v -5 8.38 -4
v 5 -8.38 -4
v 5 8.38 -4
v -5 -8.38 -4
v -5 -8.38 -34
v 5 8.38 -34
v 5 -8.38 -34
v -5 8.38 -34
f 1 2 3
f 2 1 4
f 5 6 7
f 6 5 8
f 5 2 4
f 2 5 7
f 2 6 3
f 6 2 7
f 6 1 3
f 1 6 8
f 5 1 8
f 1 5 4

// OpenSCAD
module radiused_cube(size,r)
{
    hull()
    {
        translate([r,r,0]) cylinder(r=r,h=size.z);
        translate([r,size.y-r,0]) cylinder(r=r,h=size.z);
        translate([size.x-r,r,0]) cylinder(r=r,h=size.z);
        translate([size.x-r,size.y-r,0]) cylinder(r=r,h=size.z);
    }
}


handle_length = 30;

x_pic = 500;
y_pic = 838;
z_pic = 100;

x_target = 10;
y_target = x_target * ( y_pic / x_pic );
z_target = 4;

x_scale = x_target/x_pic;
echo("x_scale: ", x_scale);

y_scale = y_target/y_pic;
echo("y_scale: ", y_scale);

z_scale = z_target/z_pic;
echo("z_scale: ", z_scale);

scale([x_scale, y_scale, z_scale])
    surface( file = "spade-500x838.png", center = true, invert = true);
    
translate([0, 0, -z_target-handle_length/2])
    cube([x_target, y_target, handle_length], center = true);
    
*translate([-x_target/2, -y_target/2, -z_target-handle_length])
    radiused_cube([x_target, y_target, handle_length],2);
    
